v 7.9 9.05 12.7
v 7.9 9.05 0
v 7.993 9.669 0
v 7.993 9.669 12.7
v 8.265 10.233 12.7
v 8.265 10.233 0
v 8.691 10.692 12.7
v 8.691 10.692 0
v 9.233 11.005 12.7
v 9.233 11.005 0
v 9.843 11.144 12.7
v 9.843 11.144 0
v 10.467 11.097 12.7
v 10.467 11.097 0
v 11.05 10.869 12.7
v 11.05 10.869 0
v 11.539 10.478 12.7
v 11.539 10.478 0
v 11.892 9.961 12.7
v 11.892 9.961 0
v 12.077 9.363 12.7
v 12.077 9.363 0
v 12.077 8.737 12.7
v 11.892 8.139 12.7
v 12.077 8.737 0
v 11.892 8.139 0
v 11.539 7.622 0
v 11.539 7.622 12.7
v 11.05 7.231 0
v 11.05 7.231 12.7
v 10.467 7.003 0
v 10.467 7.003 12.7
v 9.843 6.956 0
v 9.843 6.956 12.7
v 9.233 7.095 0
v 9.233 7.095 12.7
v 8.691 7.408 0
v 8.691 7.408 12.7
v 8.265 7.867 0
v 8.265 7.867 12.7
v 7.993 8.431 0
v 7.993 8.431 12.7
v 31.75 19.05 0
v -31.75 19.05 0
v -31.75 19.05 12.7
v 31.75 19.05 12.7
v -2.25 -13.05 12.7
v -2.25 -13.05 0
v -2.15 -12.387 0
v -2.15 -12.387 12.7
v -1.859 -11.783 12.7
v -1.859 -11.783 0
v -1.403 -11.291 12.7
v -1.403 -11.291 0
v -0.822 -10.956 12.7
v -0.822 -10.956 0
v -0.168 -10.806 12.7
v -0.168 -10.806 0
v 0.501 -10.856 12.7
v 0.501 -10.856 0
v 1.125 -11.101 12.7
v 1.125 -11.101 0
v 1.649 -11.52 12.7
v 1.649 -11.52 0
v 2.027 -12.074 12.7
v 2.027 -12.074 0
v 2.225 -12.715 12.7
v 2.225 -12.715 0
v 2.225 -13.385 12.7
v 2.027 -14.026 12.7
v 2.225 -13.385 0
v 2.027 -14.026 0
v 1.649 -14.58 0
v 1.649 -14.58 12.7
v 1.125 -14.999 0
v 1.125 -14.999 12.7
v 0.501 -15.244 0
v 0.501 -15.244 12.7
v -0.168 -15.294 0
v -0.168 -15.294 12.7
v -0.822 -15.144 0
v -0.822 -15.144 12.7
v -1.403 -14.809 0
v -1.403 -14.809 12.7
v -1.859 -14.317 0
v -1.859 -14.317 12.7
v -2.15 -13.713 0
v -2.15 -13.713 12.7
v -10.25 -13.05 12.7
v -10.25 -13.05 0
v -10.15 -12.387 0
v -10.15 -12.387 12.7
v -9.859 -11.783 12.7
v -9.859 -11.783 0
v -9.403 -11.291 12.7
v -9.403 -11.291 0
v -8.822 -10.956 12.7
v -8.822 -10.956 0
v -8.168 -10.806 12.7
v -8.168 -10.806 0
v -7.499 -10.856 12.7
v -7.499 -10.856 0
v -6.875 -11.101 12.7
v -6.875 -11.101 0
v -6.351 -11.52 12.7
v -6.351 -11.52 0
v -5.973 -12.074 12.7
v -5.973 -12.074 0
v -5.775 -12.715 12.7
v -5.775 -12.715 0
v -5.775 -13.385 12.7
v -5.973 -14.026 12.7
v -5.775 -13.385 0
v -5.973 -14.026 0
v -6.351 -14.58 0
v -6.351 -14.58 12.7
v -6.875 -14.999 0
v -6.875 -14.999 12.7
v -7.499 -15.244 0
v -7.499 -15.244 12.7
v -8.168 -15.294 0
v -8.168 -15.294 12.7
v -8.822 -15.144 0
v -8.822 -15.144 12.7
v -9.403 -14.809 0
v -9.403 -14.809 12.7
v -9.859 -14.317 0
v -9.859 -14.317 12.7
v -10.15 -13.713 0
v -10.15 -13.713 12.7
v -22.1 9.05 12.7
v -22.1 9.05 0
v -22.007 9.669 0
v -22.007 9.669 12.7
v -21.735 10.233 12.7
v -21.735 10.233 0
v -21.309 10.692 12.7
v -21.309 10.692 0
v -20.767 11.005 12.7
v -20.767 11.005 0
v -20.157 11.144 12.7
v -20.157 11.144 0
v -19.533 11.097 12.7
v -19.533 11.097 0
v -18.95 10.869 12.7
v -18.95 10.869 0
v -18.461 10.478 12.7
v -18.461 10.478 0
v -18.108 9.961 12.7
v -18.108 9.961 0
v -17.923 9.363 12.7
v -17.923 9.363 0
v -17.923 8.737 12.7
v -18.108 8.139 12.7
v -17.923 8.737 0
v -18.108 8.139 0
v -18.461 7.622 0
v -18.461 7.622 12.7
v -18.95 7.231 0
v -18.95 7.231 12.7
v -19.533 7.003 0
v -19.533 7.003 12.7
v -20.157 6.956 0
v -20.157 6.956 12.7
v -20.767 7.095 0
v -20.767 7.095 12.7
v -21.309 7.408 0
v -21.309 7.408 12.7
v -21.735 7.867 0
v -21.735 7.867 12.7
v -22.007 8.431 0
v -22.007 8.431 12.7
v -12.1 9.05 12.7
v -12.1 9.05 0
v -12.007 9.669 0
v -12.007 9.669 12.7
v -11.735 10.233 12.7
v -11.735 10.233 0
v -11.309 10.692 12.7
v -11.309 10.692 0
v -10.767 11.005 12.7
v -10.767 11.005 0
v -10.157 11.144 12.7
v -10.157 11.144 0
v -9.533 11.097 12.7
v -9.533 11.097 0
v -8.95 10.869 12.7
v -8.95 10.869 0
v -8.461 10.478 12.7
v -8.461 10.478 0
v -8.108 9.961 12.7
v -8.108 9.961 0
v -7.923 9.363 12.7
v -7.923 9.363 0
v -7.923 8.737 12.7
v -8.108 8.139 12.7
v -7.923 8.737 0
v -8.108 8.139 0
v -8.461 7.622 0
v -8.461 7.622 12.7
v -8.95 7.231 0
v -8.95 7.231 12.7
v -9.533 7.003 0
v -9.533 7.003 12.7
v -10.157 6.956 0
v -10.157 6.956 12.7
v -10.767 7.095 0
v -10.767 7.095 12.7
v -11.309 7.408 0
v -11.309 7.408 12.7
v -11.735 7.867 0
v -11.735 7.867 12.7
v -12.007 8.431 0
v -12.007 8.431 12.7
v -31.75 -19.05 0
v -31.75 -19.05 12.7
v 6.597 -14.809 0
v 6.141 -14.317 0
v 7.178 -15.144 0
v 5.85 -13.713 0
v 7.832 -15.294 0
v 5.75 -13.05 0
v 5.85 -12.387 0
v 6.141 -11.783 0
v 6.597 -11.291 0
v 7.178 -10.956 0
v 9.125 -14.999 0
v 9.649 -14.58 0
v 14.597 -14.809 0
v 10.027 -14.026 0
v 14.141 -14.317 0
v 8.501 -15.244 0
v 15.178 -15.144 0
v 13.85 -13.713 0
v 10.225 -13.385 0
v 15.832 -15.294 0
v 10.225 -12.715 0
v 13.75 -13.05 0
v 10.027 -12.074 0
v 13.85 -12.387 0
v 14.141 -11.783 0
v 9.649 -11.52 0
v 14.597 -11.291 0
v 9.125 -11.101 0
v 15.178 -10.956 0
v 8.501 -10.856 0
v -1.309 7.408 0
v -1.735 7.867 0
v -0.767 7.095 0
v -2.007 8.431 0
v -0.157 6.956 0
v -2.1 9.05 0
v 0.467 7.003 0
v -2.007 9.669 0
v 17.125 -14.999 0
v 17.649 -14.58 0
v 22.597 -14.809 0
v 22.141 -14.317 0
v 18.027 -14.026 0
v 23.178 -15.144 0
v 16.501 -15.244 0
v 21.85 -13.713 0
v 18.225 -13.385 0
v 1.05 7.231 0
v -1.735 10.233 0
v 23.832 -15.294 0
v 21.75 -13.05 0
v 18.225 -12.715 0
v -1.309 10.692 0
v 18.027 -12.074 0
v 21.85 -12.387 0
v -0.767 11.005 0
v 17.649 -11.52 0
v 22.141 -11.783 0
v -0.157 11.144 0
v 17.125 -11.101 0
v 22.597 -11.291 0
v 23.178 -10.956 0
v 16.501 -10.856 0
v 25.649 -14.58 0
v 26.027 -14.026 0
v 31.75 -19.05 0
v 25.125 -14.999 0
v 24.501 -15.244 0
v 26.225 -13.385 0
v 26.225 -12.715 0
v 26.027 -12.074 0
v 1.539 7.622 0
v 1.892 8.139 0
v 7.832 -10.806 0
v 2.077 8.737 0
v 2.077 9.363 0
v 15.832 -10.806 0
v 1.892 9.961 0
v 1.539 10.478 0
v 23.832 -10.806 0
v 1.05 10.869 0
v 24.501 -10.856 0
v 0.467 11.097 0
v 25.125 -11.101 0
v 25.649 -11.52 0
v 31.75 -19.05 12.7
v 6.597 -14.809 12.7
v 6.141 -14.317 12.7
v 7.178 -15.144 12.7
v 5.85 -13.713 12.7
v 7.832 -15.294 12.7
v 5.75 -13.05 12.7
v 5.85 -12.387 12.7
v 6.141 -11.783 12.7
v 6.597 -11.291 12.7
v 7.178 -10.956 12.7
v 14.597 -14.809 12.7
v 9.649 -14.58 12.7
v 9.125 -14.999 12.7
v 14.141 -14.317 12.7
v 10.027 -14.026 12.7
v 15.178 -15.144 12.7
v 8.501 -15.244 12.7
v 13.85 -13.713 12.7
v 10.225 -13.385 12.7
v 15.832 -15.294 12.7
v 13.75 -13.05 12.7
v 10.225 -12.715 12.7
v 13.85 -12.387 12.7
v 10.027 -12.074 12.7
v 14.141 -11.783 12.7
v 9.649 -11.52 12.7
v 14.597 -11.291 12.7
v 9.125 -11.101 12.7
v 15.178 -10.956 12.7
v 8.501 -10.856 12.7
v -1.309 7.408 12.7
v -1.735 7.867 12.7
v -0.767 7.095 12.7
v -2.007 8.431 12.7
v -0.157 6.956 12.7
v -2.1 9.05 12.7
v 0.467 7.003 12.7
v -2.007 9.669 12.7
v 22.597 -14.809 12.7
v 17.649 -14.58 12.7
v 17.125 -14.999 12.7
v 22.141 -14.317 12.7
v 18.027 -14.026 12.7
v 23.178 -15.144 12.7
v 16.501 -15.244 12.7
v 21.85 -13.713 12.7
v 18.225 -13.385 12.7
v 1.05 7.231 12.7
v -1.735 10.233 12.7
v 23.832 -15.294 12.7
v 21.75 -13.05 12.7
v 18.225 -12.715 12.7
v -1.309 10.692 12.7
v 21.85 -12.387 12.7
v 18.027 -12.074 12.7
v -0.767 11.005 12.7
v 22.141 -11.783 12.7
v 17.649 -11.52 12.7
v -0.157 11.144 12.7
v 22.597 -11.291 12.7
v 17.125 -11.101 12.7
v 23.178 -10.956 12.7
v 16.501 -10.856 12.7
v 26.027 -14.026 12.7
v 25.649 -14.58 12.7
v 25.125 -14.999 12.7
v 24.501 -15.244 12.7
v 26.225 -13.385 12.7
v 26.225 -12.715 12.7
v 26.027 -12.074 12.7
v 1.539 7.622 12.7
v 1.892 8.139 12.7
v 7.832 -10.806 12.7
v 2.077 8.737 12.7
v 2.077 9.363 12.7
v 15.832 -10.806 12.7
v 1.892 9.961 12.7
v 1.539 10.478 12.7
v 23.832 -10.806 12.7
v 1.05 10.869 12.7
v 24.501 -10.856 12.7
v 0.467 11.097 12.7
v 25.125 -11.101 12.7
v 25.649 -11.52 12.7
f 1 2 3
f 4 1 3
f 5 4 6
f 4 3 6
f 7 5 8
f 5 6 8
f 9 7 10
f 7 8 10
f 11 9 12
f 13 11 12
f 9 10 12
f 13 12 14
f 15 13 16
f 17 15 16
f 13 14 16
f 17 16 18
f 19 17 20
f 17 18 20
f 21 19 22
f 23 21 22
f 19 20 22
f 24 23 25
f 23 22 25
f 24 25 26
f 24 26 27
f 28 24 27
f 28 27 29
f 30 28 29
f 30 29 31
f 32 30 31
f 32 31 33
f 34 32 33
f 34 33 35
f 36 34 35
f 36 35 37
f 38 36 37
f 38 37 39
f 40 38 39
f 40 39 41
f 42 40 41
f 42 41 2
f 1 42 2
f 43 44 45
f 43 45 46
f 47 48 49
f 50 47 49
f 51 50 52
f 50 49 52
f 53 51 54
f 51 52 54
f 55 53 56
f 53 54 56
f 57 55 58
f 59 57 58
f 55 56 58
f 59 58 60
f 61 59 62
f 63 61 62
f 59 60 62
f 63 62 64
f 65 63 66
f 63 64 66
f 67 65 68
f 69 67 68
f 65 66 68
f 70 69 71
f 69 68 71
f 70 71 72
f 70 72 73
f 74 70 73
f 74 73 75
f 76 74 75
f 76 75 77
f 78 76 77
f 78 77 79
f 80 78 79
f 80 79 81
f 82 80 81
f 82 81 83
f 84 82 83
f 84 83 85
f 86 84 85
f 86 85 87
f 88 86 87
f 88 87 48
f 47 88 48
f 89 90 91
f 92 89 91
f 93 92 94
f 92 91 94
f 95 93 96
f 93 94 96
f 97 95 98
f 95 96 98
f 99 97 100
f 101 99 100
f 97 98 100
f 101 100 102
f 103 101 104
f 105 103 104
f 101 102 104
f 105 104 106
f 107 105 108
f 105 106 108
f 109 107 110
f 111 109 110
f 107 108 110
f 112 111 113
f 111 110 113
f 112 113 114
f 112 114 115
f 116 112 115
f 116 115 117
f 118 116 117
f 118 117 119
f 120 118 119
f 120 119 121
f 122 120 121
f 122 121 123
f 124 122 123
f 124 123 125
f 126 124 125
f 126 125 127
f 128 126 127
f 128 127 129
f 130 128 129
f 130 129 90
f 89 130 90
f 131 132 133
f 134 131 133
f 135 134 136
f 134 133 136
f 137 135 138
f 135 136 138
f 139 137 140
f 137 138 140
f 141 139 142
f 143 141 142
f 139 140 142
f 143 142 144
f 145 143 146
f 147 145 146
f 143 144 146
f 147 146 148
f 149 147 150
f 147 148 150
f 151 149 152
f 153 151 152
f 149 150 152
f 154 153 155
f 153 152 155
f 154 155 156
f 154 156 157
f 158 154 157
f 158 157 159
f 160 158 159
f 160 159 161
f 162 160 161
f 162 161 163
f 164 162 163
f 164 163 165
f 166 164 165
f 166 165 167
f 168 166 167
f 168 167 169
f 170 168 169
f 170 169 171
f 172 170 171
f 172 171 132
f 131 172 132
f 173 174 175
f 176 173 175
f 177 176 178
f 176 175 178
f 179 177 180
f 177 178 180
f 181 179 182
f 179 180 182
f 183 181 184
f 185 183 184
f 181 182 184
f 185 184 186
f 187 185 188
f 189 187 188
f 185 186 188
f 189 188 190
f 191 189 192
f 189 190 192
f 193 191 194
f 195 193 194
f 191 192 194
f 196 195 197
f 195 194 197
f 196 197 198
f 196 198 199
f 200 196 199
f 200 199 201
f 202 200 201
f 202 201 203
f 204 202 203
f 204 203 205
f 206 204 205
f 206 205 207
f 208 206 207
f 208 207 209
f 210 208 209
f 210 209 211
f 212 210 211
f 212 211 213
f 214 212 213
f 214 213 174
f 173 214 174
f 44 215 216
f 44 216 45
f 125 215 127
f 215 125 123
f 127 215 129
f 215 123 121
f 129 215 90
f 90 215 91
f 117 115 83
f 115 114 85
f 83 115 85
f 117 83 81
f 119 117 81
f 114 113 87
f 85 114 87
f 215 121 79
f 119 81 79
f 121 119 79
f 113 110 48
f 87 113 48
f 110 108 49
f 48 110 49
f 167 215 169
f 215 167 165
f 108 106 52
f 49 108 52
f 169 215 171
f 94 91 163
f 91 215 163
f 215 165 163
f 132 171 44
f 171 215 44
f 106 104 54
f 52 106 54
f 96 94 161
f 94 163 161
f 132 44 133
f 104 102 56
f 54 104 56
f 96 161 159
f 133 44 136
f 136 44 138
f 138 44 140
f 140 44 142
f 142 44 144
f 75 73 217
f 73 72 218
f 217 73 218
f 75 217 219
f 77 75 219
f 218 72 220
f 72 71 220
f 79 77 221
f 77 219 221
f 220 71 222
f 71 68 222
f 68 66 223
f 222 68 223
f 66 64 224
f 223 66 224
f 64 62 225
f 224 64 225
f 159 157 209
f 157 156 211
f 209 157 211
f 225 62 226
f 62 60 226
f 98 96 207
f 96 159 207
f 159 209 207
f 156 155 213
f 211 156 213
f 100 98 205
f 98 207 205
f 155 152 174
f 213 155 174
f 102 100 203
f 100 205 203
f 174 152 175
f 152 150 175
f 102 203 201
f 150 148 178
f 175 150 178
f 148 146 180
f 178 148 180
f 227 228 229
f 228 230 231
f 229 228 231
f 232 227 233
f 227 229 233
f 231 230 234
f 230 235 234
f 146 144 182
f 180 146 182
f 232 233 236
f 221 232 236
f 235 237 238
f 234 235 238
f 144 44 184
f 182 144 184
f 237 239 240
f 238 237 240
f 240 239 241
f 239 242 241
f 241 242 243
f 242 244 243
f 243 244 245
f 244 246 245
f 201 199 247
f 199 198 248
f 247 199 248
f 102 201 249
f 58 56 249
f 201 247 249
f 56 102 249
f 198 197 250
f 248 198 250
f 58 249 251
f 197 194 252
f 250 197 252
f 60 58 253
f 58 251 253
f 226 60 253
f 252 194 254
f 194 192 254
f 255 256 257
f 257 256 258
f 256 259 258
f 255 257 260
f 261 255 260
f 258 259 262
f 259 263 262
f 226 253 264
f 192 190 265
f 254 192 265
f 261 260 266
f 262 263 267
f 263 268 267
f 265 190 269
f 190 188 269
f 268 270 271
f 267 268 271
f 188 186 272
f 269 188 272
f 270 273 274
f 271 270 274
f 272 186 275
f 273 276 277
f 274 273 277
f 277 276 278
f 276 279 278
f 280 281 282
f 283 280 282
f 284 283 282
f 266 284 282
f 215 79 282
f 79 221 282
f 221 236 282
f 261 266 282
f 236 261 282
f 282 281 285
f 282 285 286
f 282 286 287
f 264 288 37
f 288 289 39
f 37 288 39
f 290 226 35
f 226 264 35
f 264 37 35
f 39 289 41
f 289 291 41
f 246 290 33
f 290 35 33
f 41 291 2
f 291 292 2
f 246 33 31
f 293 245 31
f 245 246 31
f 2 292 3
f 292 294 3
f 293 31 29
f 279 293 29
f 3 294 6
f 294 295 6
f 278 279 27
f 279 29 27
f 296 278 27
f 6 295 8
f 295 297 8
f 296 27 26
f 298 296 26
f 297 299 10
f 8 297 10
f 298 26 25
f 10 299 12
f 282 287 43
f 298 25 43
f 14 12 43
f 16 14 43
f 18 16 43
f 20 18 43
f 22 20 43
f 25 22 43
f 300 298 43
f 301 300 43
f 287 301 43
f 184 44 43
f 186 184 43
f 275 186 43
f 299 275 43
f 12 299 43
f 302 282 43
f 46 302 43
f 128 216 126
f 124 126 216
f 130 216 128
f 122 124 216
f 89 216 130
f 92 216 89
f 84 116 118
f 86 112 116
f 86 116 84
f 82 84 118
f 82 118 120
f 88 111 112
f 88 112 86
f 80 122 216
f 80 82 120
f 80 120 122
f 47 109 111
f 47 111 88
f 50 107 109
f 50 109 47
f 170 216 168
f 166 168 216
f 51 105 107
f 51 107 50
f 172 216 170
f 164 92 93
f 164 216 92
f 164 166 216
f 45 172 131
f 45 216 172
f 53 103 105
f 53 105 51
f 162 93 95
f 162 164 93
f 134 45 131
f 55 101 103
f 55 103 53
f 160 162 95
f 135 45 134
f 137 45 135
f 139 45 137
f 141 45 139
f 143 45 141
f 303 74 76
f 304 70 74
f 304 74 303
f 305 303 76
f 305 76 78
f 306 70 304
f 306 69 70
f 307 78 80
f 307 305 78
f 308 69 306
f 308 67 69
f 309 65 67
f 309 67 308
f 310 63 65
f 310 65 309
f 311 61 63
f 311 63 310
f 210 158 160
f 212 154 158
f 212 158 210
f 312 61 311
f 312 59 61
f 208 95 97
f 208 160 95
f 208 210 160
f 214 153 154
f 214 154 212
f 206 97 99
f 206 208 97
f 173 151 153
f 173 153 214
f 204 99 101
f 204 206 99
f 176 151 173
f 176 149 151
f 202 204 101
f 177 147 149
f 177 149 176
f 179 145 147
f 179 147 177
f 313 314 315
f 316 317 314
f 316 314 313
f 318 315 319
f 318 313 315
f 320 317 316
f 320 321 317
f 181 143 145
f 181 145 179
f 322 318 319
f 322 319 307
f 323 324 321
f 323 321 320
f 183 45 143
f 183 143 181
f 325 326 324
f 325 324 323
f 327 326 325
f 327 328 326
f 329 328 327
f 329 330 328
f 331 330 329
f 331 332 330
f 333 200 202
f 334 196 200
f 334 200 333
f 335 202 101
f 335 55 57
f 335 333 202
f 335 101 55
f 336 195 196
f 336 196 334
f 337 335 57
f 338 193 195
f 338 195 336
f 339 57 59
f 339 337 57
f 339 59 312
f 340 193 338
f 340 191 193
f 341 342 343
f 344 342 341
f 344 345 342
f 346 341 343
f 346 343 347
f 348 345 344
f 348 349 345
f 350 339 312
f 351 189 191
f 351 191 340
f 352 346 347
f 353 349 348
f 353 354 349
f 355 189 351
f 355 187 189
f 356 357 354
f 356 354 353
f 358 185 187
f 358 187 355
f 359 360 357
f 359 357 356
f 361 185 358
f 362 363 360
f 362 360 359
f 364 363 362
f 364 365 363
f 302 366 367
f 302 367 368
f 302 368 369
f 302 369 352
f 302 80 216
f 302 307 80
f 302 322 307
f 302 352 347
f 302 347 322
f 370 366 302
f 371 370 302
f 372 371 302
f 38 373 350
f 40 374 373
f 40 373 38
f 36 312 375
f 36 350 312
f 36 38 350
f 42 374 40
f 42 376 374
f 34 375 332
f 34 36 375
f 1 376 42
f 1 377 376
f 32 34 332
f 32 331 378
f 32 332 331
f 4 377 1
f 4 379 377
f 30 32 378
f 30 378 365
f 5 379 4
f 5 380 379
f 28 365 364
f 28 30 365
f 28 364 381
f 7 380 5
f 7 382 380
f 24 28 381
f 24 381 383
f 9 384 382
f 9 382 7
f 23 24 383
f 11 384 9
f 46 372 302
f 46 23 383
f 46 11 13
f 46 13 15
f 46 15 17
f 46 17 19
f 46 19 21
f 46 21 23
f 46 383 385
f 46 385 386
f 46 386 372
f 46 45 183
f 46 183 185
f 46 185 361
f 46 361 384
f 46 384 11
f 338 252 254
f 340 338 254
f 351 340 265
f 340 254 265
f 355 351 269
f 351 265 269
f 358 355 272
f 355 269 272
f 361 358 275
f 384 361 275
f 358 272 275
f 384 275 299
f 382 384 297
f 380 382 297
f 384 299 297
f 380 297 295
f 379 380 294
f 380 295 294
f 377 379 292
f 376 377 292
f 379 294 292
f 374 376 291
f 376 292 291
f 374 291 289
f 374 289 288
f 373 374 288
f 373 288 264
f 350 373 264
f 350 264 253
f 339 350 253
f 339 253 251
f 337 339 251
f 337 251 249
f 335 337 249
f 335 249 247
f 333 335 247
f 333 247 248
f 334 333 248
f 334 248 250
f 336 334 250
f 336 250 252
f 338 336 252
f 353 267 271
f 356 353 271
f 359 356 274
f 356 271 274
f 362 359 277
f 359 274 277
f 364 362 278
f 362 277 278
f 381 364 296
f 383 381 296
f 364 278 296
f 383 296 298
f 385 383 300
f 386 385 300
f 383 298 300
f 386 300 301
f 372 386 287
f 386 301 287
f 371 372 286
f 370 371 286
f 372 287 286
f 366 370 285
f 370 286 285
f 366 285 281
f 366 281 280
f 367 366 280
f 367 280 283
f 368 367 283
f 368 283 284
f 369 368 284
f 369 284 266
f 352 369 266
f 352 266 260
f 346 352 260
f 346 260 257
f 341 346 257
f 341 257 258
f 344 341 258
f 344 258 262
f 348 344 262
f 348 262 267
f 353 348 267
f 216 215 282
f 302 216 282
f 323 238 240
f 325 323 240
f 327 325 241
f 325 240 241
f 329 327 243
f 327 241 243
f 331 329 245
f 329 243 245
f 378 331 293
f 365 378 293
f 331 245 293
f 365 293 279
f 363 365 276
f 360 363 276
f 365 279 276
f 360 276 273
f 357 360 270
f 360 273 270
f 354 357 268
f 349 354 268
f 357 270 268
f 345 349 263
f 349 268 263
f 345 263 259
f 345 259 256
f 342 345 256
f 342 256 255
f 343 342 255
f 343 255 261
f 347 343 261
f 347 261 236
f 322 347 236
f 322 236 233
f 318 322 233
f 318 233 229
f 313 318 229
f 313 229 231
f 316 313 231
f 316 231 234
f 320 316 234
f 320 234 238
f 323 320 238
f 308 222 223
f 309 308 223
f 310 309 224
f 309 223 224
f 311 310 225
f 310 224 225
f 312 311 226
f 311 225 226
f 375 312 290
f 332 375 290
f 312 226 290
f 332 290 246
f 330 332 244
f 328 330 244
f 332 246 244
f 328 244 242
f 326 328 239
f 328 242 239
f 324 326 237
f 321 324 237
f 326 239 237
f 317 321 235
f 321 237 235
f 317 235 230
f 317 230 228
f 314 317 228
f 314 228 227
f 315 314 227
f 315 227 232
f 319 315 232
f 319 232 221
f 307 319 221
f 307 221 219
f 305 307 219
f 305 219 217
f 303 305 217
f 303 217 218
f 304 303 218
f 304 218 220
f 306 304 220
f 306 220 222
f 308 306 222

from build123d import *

# Parameters (mm, degrees)
SKETCH1_W             = 63.5
SKETCH1_H             = 38.1
BOSS_EXTRUDE1_DEPTH   = 12.7
M4_CLEARANCE_HOLE1_D  = 4.5
M5X0_8_TAPPED_HOLE1_D = 4.2


with BuildPart() as part:
    # Sketch1 → Boss-Extrude1 (new body)
    with BuildSketch(Plane.XY):
        Rectangle(SKETCH1_W, SKETCH1_H)
    extrude(amount=BOSS_EXTRUDE1_DEPTH)

    # M4 Clearance Hole1 (through all)
    with Locations(Plane.XY.offset(12.7)):
        with Locations((-8, -13.05), (0, -13.05), (8, -13.05), (16, -13.05), (24, -13.05)):
            Hole(M4_CLEARANCE_HOLE1_D / 2)

    # M5x0.8 Tapped Hole1 (through all)
    with Locations(Plane.XY.offset(12.7)):
        with Locations((-20, 9.05), (-10, 9.05), (0, 9.05), (10, 9.05)):
            Hole(M5X0_8_TAPPED_HOLE1_D / 2)


solid = part.part
